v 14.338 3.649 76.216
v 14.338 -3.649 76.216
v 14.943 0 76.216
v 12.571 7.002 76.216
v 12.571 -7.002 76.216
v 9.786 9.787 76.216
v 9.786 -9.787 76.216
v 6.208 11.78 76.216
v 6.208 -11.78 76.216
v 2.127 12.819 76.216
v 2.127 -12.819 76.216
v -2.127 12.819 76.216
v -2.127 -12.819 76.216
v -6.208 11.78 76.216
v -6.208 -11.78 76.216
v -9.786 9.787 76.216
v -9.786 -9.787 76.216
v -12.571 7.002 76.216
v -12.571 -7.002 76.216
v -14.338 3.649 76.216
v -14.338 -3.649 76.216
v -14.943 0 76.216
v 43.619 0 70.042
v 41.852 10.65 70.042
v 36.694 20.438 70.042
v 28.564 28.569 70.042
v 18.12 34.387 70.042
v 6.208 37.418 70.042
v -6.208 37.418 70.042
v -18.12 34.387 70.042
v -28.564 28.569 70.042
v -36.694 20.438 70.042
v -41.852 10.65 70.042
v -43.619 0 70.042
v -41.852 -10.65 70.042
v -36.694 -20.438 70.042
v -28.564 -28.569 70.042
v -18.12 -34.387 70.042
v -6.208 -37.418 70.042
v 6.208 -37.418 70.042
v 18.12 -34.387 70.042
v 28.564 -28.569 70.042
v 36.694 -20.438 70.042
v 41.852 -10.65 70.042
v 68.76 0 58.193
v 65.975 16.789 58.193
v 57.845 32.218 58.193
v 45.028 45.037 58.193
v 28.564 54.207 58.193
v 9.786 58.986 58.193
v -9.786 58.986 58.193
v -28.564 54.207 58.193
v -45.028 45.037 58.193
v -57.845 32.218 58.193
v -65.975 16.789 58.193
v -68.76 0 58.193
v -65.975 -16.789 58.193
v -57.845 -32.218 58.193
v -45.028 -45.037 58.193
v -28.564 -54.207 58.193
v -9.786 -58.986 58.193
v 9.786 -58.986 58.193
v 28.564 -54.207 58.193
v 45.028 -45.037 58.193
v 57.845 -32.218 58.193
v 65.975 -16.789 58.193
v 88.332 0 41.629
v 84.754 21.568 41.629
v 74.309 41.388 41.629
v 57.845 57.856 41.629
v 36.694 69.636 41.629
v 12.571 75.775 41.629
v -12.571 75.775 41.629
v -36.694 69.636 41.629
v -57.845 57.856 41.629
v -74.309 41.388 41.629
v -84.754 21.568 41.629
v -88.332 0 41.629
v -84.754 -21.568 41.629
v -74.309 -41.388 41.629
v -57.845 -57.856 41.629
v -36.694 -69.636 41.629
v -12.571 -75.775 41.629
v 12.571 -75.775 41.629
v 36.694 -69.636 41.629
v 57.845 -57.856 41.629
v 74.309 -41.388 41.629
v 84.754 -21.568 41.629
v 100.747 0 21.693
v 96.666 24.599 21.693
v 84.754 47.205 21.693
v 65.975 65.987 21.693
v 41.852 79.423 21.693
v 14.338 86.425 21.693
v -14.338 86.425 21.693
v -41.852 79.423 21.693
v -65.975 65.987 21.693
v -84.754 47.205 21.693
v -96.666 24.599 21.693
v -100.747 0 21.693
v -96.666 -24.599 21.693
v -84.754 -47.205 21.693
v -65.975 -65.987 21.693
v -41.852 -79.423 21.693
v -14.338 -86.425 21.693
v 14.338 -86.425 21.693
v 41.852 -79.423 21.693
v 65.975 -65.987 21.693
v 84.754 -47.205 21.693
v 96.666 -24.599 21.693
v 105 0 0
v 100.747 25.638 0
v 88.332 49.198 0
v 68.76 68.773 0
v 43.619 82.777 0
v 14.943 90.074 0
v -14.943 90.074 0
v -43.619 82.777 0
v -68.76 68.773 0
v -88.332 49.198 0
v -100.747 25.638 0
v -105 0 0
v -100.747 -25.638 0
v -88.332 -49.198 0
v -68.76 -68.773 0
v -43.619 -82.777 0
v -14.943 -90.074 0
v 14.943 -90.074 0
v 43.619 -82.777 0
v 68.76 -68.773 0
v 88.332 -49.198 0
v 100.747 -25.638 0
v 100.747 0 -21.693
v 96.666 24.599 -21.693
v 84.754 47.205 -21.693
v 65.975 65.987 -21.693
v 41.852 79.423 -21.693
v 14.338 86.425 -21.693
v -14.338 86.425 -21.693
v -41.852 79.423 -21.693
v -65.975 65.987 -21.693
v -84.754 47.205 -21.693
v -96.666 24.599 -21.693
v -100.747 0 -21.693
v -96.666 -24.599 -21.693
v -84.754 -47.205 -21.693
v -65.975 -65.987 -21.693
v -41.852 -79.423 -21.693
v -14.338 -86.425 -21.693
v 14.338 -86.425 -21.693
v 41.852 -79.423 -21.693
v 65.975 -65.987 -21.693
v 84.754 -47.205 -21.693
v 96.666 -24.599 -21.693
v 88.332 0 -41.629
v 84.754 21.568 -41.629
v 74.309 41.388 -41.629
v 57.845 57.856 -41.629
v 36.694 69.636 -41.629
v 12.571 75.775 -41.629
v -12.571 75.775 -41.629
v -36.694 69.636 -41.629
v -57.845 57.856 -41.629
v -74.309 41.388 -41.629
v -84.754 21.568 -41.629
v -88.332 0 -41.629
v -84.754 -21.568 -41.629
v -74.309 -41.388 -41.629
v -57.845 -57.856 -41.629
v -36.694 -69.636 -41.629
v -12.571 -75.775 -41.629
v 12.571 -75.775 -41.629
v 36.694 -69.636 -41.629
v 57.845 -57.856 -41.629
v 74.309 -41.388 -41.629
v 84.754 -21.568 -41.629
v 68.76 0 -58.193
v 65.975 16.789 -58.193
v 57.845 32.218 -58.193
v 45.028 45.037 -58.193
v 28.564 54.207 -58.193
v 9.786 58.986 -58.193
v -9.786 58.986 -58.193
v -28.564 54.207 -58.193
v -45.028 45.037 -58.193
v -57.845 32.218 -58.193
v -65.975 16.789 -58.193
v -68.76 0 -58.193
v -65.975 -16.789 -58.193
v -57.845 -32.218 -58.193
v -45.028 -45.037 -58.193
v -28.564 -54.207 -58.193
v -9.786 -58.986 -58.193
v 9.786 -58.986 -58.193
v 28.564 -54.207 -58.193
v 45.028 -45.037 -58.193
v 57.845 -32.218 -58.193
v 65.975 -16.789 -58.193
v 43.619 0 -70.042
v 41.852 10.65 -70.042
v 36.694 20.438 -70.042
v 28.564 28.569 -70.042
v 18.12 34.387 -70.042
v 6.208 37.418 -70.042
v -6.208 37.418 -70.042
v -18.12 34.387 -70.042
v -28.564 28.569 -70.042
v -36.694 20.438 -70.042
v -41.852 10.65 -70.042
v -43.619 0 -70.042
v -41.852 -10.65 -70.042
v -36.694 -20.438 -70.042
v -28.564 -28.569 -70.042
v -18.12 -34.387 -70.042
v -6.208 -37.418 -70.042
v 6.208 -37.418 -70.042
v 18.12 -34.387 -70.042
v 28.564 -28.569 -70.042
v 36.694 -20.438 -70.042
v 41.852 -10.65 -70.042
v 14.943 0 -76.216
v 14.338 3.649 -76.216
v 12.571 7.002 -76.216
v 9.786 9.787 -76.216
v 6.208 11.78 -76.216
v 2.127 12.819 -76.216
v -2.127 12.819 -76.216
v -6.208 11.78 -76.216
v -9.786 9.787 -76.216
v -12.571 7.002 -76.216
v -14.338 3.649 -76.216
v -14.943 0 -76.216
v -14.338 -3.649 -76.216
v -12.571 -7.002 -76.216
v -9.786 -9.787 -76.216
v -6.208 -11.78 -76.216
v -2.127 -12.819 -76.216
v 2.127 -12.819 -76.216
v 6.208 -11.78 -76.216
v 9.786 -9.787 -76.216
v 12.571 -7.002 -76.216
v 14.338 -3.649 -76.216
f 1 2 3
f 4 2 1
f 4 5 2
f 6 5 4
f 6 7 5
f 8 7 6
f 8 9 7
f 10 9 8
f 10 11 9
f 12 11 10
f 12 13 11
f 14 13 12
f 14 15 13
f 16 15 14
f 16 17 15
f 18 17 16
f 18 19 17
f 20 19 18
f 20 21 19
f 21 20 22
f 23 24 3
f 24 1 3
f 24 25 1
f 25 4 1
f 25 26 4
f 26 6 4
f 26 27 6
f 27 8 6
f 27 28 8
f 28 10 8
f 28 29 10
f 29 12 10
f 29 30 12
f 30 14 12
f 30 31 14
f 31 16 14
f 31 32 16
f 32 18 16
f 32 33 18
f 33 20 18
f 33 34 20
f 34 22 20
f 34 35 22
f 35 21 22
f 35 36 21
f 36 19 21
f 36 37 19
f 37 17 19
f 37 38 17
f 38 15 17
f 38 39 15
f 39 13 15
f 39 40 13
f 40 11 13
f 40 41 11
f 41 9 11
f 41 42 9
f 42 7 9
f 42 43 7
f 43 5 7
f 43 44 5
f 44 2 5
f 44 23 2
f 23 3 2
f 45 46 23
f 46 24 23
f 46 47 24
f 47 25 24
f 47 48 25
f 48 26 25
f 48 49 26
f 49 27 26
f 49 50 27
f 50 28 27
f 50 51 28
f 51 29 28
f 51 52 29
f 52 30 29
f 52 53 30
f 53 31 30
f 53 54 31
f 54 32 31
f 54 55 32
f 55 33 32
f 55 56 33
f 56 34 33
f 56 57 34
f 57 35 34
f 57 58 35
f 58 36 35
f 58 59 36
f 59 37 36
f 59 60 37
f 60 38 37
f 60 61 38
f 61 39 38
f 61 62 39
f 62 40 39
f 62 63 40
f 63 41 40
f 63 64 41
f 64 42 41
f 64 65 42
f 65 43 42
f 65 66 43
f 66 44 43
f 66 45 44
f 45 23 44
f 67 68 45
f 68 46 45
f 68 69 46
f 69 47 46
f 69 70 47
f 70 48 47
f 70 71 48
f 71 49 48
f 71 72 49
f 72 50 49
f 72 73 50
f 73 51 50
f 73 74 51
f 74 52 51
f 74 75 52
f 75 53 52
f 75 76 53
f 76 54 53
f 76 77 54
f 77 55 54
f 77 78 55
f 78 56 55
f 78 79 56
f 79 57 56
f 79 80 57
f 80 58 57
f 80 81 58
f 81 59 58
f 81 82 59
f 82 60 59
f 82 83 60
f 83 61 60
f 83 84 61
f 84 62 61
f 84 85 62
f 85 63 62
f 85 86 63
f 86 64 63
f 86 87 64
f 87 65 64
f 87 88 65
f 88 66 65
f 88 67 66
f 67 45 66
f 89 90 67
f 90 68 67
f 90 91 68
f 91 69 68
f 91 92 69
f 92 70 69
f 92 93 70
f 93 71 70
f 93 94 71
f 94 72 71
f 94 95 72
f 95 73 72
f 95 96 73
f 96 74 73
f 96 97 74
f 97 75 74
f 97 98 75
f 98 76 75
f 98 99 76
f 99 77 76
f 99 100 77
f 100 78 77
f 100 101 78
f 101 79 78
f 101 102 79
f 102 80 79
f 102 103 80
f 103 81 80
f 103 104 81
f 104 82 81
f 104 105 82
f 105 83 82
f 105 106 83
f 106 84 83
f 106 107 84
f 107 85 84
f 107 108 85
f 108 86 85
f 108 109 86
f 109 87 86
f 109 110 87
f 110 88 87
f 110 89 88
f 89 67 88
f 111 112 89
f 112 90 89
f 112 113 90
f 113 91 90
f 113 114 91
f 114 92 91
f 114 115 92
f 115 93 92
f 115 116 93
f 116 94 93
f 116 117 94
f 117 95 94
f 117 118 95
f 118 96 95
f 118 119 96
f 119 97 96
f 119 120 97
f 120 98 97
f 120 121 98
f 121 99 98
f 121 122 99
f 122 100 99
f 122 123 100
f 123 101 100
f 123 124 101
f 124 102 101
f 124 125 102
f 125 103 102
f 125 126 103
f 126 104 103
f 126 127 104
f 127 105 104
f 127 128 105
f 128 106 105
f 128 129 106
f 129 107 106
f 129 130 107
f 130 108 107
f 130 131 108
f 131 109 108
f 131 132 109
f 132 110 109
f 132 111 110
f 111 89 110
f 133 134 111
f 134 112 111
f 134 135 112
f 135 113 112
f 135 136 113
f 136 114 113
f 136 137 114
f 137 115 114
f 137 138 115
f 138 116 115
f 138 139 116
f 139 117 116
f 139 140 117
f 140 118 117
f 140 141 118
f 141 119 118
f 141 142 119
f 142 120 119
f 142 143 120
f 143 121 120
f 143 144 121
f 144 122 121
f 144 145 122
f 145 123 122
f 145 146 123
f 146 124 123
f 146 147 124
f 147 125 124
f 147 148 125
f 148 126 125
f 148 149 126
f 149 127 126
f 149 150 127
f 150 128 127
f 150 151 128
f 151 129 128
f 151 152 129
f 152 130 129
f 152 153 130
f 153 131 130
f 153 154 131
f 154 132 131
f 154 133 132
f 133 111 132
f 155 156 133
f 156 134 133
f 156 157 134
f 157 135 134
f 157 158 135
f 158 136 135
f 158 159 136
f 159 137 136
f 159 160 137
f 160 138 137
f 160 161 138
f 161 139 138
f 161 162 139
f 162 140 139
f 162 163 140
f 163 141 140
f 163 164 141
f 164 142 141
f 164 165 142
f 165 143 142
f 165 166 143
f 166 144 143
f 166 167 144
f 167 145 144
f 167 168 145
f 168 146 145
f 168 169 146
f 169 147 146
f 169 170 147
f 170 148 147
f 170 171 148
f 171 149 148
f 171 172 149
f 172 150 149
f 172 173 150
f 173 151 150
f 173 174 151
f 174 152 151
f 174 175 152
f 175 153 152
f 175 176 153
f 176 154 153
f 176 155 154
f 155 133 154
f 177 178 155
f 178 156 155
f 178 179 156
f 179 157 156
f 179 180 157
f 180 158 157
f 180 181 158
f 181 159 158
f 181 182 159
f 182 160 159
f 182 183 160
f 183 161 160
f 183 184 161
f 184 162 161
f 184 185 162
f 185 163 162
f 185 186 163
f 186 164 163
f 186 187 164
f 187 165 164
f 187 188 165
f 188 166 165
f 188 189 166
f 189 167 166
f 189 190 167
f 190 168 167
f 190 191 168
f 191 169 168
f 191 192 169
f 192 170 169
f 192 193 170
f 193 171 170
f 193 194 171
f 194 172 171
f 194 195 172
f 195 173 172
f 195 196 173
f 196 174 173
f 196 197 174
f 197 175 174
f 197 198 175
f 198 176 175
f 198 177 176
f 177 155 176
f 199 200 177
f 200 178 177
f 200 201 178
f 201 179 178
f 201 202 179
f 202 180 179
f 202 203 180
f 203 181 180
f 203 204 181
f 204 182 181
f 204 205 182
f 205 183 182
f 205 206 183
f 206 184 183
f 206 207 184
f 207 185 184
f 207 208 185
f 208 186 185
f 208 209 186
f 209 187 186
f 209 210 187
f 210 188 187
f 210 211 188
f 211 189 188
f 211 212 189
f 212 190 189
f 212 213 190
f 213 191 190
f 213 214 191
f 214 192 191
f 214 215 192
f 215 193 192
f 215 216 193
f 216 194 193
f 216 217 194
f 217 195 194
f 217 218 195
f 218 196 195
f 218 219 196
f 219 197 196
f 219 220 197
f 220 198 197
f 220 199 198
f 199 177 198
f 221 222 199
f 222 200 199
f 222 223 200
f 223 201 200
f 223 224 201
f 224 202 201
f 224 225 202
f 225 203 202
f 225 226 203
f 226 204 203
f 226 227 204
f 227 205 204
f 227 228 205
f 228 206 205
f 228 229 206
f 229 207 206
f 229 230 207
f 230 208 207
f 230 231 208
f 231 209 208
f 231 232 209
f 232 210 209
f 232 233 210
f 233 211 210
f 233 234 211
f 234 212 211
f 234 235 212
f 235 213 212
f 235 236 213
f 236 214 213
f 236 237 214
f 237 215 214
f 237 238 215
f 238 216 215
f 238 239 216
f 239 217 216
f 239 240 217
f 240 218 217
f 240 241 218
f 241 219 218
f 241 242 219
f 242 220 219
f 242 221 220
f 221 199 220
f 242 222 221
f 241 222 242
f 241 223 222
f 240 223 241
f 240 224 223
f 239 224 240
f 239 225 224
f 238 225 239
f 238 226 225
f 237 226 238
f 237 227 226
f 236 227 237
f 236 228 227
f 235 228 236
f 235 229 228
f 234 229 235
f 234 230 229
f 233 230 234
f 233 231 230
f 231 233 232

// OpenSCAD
// Generated by SolidPython 1.0.1 on 2020-07-29 00:46:52


scale(v = [15, 13, 11]) {
	sphere(r = 7);
}
/***********************************************
*********      SolidPython code:      **********
************************************************
 
# import packages: SolidPython
from solid import *
from solid.utils import *
from itertools import chain, combinations, permutations


class Resize:

    def __init__(self, scad_file):
        self.scad_file = scad_file
        #self.scad_file = import_scad(scad_file)
        # cone/cylinder param:
        self.r1 = 0
        self.r2 = 0
        self.h = 0
        # rectangular prism param:
        self.w = 0
        self.l = 0
        # ellipse param:
        self.r = 0

    # import OpenScad code (file name corresponds to shape)


    # classify shape + parameters
    def assign(self, param1, param2, param3):
        if self.scad_file == 'cone.scad':
            self.r1 = param1
            self.r2 = param2
            self.h = param3
        elif self.scad_file == 'cylinder.scad':
            self.r1 = param1
            self.r2 = param2
            self.h = param3
        elif self.scad_file == 'rectangularPrism.scad':
            self.h = param1
            self.l = param2
            self.w = param3
        else:
            self.r = param1
            self.h = param2

    # resize parameters
    def iterate(self):
        x = range(3, 20, 2)
        i = 1
        if self.scad_file == 'cone.scad':
            tempList = list(permutations(x, 2))
            for temp in tempList:
                param1 = temp[0]
                param2 = temp[1]
                filepath = 'produced_scad_files/' + 'cone' + str(param1) + '_' + str(param2) + '_' + '.scad'
                scad_render_to_file(cylinder(h=param1, r1=param2, r2=0), filepath)

        elif self.scad_file == 'cylinder.scad':
            tempList = list(permutations(x, 3))
            for temp in tempList:
                param1 = temp[0]
                param2 = temp[1]
                filepath = 'produced_scad_files/' + 'cylinder' + str(param1) + '_' + str(param2) + '_' + '.scad'
                scad_render_to_file(cylinder(h=param1, r1=param2, r2=param2), filepath)

        elif self.scad_file == 'rectangularPrism.scad':
            tempList = list(permutations(x, 3))
            for temp in tempList:
                param1 = temp[0]
                param2 = temp[1]
                param3 = temp[2]
                filepath = 'produced_scad_files/' + 'rectangularPrism' + str(param1) + '_' + str(param2) + '_' + str(
                    param3) + '.scad'
                scad_render_to_file(cube(size=(param1, param2, param3)), filepath)

        elif self.scad_file == 'ellipse.scad':
            tempList = list(permutations(x, 4))
            for temp in tempList:
                param1 = temp[0]
                param2 = temp[1]
                param3 = temp[2]
                param4 = temp[3]
                filepath = 'produced_scad_files/' + 'ellipse' + str(param1) + '_' + str(param2) + '_' + str(param3) + '_' + str(param4) + '.scad'
                scad_render_to_file(scale([param1, param2, param3])(sphere(r=param4)), filepath)

    def render_to_scadfile(self):
        scad_render_to_file(scad, 'example.scad') 
 
************************************************/
